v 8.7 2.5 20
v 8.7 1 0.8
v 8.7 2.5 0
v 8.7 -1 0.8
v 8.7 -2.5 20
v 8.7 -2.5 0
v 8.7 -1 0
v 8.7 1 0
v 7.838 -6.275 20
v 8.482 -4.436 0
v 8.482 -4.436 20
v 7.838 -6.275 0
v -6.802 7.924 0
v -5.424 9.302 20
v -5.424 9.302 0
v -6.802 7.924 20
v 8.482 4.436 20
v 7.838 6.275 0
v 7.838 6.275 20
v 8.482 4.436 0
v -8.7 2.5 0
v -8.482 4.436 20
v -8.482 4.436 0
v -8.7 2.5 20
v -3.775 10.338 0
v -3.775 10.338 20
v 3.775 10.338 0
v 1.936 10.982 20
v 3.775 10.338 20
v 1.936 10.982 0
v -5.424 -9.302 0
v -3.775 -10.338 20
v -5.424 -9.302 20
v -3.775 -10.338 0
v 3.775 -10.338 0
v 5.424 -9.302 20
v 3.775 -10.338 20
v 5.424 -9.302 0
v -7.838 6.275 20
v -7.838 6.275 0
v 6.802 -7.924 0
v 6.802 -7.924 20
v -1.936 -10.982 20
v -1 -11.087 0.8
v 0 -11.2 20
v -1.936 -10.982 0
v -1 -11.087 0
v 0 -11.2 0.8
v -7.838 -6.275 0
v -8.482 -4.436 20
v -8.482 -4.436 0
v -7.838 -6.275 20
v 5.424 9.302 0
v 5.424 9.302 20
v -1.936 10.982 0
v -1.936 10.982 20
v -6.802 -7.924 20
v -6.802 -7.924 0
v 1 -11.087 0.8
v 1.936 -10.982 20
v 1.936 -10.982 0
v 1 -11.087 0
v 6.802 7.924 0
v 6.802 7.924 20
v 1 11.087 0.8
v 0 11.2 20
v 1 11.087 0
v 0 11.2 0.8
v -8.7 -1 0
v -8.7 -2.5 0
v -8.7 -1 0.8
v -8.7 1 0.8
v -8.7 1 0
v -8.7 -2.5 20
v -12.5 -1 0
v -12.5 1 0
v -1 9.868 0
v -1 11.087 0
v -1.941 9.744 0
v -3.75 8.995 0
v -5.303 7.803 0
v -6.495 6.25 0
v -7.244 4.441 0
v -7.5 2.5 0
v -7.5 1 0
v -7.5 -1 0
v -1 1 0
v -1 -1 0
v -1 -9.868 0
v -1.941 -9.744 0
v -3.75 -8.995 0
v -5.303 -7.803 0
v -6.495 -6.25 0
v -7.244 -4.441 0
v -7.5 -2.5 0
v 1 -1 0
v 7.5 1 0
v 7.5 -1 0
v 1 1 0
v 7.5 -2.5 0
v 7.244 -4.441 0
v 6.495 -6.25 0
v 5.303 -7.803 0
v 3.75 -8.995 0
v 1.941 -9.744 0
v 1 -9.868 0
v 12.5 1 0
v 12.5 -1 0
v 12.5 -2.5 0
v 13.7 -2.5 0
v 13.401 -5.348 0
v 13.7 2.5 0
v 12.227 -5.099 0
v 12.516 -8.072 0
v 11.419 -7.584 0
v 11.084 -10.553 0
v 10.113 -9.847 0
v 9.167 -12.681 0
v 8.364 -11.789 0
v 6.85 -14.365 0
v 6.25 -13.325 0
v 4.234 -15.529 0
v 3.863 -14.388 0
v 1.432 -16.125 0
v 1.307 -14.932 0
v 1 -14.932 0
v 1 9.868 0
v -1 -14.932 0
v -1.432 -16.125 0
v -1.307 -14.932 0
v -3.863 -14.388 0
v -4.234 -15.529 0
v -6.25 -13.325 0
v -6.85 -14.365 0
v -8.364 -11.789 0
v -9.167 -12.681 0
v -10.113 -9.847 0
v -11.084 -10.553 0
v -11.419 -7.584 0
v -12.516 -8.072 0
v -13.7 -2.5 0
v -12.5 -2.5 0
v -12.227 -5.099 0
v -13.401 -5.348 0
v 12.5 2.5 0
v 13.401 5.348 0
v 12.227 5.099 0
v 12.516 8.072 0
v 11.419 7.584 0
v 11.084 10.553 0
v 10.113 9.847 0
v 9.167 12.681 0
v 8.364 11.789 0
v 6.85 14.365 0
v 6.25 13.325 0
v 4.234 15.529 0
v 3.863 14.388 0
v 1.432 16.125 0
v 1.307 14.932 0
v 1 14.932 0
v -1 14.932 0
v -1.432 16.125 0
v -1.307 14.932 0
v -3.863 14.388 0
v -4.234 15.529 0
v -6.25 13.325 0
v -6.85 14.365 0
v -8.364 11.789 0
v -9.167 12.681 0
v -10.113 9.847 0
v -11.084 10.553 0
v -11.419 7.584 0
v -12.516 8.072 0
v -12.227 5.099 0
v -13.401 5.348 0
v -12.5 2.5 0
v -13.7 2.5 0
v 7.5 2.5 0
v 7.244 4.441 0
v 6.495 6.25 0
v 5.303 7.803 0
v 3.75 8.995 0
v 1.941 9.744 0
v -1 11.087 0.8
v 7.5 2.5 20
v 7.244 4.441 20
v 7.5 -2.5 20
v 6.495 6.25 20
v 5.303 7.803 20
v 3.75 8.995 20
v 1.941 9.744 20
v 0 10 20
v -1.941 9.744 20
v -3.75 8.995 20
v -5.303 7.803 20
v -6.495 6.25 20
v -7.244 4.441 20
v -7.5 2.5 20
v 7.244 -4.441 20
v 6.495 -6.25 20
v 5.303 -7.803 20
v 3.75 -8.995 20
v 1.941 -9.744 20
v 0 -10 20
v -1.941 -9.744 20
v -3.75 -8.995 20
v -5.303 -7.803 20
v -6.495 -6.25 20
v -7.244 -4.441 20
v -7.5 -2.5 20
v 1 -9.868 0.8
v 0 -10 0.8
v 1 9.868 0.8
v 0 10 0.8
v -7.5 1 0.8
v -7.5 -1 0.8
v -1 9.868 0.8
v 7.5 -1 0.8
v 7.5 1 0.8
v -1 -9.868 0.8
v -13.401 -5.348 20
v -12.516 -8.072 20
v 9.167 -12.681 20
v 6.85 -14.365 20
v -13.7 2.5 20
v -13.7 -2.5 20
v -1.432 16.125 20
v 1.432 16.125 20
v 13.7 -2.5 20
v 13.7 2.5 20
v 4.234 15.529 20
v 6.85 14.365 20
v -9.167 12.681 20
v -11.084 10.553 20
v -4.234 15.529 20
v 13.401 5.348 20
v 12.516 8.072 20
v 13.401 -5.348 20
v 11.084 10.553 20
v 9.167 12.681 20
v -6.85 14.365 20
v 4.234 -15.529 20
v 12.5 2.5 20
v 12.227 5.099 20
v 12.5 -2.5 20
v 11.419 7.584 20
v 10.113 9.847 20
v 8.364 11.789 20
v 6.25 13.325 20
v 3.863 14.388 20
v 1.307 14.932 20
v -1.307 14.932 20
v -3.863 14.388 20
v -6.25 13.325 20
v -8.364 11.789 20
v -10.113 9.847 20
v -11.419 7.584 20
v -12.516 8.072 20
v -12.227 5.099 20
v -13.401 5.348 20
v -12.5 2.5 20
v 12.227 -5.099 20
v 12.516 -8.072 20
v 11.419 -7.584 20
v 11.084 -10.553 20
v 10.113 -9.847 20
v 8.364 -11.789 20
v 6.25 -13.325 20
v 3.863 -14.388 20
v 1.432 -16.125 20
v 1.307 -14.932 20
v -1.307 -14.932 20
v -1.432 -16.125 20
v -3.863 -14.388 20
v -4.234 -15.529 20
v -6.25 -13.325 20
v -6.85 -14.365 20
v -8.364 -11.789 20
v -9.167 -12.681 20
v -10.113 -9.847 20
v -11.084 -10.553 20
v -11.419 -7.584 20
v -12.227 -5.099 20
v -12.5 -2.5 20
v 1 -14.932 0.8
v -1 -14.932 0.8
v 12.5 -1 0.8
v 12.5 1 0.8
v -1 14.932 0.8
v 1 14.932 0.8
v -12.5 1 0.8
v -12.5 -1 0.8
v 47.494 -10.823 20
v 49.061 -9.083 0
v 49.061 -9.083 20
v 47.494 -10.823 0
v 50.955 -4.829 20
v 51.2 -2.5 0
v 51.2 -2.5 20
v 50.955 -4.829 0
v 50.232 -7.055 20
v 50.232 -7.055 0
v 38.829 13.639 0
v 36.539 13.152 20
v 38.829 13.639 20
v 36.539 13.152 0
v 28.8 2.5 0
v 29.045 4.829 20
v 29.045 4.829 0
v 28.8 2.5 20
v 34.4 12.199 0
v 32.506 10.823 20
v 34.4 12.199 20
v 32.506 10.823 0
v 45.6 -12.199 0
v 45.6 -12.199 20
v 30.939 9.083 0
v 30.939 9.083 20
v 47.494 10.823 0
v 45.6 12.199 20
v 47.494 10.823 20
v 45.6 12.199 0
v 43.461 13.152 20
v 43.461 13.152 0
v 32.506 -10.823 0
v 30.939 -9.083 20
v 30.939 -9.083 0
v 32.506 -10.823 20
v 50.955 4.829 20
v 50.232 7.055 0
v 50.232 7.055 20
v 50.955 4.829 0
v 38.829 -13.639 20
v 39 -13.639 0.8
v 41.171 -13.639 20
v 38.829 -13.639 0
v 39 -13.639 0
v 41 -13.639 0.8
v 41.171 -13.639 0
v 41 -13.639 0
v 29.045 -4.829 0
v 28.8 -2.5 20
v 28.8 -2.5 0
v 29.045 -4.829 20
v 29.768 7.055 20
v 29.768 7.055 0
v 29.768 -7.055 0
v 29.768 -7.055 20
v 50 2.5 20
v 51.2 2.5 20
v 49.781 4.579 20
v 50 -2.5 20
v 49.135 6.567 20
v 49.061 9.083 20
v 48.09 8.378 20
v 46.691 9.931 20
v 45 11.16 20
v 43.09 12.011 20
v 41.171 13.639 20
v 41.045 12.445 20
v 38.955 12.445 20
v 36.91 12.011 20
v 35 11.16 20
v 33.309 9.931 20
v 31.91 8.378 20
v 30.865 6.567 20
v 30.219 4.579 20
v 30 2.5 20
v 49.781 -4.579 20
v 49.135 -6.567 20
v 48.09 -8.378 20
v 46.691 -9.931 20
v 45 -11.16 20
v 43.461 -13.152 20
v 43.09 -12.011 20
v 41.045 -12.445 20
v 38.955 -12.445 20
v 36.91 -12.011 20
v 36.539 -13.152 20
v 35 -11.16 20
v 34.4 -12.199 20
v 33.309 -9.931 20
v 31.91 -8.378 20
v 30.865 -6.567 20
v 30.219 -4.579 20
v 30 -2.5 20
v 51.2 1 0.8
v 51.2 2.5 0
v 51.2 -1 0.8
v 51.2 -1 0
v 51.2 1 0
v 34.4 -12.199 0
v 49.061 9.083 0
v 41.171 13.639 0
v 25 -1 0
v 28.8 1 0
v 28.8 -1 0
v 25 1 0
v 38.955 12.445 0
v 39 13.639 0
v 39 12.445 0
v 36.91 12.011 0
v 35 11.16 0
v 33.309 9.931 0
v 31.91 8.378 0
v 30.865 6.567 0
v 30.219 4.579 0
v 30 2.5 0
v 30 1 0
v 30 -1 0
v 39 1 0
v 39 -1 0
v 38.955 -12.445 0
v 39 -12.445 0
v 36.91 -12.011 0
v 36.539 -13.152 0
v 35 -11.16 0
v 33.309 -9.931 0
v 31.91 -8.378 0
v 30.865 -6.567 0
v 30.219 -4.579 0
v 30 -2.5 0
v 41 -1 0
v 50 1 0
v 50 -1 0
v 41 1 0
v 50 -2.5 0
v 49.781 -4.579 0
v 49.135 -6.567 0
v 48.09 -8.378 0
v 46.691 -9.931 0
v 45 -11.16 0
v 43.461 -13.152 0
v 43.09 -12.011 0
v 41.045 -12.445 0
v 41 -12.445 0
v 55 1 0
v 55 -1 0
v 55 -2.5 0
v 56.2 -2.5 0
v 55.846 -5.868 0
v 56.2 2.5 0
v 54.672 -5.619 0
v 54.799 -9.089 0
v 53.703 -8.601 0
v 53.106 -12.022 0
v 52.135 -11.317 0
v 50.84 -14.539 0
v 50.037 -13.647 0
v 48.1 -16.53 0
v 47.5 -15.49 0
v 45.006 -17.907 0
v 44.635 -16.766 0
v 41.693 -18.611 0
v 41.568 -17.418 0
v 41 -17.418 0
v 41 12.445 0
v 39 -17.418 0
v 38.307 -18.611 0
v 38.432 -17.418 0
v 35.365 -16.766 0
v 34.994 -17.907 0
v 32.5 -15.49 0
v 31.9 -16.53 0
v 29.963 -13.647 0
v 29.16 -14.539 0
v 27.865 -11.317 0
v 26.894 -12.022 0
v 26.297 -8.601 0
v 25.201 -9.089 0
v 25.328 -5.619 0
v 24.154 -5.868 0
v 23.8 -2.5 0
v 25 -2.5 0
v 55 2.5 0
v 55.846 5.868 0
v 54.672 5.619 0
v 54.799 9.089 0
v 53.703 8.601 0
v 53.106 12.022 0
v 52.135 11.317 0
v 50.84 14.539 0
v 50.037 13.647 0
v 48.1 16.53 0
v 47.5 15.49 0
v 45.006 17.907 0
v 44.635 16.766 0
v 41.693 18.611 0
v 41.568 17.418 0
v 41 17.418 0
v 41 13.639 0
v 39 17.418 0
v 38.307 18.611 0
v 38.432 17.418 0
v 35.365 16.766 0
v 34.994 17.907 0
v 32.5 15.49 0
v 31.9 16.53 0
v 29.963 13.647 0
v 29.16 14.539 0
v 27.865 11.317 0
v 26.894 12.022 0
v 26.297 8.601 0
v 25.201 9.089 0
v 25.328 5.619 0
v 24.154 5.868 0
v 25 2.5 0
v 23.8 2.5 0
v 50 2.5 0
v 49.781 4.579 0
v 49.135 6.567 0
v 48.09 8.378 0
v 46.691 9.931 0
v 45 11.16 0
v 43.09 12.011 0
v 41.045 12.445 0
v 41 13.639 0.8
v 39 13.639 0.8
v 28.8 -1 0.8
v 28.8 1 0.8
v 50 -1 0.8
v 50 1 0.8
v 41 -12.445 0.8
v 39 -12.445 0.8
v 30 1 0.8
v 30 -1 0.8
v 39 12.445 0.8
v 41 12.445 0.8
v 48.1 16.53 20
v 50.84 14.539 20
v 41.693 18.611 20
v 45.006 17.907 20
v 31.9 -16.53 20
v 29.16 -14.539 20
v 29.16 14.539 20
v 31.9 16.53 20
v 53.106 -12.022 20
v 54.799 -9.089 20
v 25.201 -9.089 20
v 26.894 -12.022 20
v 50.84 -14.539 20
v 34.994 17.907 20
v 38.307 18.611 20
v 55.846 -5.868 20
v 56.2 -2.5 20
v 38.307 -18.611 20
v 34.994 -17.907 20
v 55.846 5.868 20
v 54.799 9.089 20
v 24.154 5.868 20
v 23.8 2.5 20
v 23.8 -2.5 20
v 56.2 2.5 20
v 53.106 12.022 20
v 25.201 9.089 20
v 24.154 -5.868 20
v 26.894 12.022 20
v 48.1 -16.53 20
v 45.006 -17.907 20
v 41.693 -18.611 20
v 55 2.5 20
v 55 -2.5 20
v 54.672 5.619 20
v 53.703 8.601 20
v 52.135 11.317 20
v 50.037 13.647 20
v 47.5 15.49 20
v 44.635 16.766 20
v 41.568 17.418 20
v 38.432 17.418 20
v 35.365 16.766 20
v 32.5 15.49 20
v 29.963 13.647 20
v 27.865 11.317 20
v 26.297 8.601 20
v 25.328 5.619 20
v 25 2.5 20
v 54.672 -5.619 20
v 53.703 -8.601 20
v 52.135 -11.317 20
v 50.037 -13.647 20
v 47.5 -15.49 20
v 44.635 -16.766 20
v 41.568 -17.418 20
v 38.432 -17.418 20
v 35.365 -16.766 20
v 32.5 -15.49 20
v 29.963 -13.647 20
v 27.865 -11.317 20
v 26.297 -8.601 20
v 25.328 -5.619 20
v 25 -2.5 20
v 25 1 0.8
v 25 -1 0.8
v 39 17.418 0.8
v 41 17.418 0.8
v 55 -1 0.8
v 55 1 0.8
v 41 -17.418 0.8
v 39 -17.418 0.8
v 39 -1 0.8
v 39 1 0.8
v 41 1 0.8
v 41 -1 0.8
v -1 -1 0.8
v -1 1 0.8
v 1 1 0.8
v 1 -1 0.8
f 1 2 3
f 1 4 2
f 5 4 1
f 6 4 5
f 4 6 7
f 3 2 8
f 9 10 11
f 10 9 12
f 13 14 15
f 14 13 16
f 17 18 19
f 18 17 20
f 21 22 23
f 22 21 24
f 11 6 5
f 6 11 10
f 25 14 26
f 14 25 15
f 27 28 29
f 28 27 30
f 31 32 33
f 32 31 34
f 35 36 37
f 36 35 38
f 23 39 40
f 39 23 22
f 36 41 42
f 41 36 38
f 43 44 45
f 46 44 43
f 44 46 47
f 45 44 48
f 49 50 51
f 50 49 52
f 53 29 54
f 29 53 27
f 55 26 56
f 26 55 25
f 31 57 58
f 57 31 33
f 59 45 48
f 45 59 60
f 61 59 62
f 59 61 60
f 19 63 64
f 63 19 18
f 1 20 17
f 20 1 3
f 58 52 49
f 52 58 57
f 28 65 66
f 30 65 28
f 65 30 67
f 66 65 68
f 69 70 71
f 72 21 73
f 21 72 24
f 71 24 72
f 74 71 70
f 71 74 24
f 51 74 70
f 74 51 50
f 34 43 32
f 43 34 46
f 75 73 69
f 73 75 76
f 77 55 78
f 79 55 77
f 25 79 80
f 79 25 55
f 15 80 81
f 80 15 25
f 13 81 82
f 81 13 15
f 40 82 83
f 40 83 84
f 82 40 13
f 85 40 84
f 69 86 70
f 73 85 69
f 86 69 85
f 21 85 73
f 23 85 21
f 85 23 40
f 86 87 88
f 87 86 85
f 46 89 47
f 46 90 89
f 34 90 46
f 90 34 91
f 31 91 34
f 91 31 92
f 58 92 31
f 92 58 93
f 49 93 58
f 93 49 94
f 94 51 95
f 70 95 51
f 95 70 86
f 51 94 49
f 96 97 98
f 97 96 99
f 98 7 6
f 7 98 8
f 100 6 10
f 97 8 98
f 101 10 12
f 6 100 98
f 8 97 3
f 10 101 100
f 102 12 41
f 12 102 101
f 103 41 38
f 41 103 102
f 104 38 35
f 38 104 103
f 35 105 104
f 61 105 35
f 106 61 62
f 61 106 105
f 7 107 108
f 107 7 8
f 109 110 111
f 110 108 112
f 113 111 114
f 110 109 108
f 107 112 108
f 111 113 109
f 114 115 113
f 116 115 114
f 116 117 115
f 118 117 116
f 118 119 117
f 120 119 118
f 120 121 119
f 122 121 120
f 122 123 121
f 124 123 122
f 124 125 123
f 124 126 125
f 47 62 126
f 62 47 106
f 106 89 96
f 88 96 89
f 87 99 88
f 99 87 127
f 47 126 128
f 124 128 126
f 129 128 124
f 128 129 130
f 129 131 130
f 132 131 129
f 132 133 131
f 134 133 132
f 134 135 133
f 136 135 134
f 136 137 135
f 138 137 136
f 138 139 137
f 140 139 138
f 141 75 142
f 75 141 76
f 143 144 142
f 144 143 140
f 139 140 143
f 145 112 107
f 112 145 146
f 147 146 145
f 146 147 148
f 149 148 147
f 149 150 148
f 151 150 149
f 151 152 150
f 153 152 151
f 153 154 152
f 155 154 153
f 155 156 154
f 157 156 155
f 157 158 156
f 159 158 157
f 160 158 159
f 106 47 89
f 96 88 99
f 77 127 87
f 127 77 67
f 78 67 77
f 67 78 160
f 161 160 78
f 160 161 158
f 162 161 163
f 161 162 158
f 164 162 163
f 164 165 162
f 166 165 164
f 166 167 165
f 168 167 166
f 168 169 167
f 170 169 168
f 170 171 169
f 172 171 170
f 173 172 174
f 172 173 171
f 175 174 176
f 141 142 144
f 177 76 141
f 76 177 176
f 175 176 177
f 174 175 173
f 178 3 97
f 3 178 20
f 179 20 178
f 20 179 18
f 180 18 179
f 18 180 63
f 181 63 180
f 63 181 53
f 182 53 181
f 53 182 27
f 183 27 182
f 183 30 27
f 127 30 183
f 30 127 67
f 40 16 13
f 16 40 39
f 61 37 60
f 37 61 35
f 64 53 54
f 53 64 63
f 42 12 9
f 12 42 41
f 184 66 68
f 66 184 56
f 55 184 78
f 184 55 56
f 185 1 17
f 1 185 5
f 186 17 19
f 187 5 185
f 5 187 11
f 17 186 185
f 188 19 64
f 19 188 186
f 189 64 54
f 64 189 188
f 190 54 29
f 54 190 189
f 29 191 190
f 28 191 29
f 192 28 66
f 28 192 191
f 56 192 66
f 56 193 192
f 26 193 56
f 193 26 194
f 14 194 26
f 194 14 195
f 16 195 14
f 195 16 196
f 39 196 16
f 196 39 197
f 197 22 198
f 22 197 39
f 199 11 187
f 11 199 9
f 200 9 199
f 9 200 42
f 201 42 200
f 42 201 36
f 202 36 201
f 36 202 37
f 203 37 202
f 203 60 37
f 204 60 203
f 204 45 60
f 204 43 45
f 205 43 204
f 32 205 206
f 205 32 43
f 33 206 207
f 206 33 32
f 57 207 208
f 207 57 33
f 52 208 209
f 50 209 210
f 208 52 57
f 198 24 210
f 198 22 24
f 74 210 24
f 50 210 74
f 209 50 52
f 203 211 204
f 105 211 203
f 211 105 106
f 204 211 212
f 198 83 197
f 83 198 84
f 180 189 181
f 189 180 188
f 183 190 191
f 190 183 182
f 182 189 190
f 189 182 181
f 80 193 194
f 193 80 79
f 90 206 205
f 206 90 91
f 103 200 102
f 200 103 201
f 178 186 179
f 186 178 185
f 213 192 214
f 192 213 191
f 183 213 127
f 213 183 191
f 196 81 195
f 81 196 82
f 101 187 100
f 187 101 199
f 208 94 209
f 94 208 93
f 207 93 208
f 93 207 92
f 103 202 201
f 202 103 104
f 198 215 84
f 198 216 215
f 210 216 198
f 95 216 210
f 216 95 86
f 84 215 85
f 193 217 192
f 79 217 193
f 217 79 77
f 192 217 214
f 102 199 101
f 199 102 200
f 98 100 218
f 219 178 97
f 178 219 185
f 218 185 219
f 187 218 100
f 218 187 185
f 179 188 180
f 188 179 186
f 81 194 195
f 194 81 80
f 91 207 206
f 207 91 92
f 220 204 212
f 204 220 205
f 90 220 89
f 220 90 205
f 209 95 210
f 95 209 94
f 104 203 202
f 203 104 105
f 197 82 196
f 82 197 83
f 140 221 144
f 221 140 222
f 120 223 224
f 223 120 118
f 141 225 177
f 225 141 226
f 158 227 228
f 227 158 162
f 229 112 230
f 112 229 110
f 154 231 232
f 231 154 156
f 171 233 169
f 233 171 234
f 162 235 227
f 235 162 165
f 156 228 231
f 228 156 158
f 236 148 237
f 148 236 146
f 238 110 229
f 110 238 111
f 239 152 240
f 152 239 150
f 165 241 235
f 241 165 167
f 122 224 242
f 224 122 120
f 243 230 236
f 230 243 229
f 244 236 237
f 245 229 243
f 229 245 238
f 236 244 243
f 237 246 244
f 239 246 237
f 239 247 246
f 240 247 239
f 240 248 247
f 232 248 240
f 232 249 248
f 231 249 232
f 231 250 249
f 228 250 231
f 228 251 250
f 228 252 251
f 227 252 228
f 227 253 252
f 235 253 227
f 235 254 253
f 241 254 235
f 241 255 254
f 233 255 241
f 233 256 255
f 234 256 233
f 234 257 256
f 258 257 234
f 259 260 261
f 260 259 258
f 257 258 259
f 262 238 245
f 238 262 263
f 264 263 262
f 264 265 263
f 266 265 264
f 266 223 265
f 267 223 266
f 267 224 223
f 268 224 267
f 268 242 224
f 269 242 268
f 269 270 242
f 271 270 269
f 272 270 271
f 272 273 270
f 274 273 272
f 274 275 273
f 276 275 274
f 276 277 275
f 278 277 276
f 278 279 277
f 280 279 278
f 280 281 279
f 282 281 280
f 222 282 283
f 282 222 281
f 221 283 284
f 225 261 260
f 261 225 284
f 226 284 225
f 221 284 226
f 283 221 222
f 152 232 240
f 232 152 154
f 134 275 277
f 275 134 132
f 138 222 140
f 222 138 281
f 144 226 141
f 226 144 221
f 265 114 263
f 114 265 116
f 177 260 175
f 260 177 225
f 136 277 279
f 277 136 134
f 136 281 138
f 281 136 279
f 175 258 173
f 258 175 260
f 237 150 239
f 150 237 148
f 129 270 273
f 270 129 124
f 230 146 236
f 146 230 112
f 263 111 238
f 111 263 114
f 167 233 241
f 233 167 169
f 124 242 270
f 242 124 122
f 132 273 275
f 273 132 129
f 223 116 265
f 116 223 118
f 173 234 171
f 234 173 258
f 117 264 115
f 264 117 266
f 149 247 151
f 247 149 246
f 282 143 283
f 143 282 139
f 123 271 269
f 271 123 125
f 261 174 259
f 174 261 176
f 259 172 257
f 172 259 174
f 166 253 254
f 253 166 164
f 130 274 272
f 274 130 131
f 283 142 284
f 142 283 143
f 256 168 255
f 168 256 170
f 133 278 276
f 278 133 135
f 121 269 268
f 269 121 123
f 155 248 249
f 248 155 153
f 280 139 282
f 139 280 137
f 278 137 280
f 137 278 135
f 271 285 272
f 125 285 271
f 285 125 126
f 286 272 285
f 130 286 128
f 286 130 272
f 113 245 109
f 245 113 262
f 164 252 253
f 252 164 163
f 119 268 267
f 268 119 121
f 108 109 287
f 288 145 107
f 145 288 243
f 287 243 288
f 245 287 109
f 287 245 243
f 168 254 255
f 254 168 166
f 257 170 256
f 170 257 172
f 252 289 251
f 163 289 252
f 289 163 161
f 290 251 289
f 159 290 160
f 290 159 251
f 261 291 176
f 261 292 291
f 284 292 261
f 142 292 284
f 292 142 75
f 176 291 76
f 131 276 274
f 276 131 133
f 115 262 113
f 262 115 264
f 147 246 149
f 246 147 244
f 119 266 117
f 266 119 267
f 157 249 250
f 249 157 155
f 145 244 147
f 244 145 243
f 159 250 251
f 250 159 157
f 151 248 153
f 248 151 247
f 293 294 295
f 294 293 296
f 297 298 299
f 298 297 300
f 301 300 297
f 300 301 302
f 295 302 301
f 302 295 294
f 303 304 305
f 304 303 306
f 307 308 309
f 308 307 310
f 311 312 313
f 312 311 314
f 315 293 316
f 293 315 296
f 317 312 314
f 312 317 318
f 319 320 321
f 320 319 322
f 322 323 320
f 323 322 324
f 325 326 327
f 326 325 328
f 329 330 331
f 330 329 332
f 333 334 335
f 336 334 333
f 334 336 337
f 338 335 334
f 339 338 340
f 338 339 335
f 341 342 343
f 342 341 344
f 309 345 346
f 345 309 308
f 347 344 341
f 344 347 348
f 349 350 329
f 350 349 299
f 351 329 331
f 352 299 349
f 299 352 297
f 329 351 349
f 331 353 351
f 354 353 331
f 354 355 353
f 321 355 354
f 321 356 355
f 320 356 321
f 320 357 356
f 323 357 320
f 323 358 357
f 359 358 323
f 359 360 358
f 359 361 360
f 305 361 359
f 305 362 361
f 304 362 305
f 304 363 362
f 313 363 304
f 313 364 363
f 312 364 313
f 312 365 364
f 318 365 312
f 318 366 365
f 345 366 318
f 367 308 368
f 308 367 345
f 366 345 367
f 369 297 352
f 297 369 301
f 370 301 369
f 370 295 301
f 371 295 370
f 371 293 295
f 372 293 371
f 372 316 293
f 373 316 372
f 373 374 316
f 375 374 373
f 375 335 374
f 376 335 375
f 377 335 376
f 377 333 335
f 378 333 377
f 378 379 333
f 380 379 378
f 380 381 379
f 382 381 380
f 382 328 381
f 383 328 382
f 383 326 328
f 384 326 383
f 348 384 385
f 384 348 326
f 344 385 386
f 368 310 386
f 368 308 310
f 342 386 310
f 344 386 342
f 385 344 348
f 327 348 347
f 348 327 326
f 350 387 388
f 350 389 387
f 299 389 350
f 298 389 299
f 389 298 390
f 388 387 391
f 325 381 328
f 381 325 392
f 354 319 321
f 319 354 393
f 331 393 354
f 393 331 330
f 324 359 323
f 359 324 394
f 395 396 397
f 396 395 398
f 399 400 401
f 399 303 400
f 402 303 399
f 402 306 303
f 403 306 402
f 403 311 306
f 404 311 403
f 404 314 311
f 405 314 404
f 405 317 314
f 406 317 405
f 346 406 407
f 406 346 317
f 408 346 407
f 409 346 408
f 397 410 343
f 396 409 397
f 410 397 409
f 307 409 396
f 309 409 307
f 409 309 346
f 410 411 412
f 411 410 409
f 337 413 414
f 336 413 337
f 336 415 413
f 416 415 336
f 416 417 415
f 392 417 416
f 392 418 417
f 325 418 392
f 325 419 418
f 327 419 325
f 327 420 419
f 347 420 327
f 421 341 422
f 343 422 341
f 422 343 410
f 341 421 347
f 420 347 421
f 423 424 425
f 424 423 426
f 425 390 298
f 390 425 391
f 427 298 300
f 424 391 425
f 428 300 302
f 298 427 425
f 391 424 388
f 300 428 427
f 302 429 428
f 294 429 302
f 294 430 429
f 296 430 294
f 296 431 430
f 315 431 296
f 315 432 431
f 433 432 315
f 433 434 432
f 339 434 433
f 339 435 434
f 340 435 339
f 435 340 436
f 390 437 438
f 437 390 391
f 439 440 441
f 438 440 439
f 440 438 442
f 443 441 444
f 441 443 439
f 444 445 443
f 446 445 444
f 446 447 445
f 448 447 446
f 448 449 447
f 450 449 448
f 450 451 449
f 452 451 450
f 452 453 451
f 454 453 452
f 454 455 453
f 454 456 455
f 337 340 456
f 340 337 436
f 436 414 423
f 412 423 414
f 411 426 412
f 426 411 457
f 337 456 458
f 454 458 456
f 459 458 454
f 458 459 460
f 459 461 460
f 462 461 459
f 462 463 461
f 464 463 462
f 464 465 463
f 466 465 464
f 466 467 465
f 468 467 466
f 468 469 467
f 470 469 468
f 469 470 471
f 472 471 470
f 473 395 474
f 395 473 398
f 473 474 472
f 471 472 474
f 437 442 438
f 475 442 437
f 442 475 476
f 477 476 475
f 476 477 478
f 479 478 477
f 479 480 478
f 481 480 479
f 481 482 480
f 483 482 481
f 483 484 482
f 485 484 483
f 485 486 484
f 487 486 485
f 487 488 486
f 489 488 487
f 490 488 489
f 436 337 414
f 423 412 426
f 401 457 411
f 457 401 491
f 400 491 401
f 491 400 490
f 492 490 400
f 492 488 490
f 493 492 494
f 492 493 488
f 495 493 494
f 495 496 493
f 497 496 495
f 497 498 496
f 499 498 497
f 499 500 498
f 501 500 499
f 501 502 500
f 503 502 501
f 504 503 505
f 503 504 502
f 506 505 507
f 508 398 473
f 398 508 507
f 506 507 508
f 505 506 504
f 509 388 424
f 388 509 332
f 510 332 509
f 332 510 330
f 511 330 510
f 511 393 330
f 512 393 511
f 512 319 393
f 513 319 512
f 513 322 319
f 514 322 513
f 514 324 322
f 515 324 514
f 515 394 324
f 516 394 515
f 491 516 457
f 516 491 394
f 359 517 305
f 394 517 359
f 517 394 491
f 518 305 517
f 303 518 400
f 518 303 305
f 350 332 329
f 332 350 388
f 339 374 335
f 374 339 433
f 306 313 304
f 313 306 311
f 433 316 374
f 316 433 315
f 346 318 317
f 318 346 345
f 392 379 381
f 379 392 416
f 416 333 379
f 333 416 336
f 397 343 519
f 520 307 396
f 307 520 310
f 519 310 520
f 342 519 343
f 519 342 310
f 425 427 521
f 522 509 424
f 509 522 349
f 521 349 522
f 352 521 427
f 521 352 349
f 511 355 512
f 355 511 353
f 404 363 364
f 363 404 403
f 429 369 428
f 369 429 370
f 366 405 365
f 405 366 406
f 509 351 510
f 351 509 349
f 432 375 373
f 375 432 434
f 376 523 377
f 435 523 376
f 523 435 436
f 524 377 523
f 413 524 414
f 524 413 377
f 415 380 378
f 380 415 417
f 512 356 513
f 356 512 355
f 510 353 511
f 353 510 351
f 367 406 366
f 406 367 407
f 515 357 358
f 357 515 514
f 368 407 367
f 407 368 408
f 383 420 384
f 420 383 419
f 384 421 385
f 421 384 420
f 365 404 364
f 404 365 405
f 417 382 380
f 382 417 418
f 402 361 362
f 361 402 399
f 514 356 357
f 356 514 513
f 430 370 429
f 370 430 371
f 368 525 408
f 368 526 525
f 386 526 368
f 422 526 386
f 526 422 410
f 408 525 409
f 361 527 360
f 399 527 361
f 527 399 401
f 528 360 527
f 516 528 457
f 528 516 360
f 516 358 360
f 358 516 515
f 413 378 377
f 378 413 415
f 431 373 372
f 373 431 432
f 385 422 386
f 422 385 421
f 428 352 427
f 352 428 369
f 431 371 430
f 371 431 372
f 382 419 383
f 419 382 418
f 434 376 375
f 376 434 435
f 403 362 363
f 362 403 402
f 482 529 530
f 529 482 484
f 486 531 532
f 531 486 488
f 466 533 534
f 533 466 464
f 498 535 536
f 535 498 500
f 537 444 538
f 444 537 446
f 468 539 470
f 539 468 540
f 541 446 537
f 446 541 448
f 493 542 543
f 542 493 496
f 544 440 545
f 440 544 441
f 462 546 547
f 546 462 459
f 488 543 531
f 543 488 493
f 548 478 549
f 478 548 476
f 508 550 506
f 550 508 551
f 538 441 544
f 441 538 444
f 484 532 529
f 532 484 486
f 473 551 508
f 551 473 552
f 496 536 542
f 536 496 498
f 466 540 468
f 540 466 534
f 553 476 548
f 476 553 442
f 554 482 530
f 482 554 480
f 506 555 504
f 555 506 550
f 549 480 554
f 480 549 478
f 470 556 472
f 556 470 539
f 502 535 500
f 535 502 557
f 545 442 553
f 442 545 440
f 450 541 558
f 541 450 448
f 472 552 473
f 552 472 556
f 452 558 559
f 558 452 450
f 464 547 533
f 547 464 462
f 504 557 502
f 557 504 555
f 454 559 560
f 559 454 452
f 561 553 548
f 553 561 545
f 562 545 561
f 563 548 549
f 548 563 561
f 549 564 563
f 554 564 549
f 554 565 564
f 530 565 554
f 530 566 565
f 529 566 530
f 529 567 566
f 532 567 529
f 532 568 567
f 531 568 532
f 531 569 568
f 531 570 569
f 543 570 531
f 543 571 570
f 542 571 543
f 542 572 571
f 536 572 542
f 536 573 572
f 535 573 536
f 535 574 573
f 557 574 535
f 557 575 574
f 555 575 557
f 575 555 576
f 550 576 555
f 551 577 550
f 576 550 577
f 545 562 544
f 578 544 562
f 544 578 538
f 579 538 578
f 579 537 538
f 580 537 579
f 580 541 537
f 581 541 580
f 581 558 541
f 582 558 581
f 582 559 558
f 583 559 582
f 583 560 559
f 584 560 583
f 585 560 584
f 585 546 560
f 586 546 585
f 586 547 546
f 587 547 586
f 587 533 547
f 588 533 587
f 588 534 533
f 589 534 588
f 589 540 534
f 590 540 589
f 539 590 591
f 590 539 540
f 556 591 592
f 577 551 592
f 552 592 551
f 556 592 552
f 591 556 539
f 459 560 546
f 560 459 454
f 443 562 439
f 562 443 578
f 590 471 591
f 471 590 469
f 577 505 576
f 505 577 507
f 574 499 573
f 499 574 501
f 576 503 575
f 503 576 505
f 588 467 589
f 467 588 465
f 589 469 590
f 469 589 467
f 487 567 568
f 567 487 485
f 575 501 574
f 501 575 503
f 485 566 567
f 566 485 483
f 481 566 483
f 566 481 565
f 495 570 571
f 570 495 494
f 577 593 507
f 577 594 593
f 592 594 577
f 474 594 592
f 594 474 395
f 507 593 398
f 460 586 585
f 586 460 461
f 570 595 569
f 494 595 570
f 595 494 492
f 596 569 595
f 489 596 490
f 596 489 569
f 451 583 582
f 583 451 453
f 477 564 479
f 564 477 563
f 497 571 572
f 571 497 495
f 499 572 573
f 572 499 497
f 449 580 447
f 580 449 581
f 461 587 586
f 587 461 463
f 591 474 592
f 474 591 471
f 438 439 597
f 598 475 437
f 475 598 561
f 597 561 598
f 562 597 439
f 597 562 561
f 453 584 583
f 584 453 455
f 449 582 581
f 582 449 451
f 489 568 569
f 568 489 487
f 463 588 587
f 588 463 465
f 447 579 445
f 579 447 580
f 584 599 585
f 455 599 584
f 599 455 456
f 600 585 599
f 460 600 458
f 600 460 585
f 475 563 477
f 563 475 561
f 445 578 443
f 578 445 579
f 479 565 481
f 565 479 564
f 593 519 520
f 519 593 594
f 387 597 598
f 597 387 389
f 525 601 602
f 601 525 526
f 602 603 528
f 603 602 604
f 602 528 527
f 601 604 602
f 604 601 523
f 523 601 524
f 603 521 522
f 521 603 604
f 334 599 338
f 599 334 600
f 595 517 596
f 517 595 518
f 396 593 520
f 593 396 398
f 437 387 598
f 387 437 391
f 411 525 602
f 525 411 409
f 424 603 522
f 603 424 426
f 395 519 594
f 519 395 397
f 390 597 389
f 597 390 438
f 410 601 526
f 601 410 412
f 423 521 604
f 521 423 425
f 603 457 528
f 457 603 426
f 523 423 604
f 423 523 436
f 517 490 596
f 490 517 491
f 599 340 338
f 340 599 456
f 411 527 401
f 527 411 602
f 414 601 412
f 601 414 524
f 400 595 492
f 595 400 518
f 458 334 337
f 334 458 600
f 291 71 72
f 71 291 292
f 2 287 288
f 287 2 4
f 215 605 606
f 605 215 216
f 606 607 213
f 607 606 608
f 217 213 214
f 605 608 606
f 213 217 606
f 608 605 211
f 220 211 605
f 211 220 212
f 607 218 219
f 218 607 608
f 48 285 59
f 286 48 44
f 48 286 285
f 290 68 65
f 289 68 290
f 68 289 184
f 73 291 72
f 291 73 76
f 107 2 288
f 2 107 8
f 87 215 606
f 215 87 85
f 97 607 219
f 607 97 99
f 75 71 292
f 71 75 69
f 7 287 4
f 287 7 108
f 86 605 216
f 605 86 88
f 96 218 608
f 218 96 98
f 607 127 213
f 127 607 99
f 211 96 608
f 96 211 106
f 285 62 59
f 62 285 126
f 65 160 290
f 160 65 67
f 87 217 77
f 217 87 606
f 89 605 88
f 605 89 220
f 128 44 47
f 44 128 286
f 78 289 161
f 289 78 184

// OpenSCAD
module sleeve(x, y, z, d) {
    translate([0, (y-x)/-2, 0]) {
        difference() {
            hull() {
                cylinder(h=z, d=2*d+x);
                translate([0, y-x, 0]) cylinder(h=z, d=2*d+x);    
            }
            hull() {
                cylinder(h=z, d=x);
                translate([0, y-x, 0]) cylinder(h=z, d=x);
            }
        }
    }
}

sleeve(15, 20, 20, 1.2);
sleeve(25, 30, 20, 1.2);
translate([-12.5, -1, 0]) cube([25, 2, 0.8]);
translate([-1, -15, 0]) cube([2, 30, 0.8]);

translate([40, 0, 0]) {
    sleeve(20, 25, 20, 1.2);
    sleeve(30, 35, 20, 1.2);
    translate([-15, -1, 0]) cube([30, 2, 0.8]);
    translate([-1, -17.5, 0]) cube([2, 35, 0.8]);
}
